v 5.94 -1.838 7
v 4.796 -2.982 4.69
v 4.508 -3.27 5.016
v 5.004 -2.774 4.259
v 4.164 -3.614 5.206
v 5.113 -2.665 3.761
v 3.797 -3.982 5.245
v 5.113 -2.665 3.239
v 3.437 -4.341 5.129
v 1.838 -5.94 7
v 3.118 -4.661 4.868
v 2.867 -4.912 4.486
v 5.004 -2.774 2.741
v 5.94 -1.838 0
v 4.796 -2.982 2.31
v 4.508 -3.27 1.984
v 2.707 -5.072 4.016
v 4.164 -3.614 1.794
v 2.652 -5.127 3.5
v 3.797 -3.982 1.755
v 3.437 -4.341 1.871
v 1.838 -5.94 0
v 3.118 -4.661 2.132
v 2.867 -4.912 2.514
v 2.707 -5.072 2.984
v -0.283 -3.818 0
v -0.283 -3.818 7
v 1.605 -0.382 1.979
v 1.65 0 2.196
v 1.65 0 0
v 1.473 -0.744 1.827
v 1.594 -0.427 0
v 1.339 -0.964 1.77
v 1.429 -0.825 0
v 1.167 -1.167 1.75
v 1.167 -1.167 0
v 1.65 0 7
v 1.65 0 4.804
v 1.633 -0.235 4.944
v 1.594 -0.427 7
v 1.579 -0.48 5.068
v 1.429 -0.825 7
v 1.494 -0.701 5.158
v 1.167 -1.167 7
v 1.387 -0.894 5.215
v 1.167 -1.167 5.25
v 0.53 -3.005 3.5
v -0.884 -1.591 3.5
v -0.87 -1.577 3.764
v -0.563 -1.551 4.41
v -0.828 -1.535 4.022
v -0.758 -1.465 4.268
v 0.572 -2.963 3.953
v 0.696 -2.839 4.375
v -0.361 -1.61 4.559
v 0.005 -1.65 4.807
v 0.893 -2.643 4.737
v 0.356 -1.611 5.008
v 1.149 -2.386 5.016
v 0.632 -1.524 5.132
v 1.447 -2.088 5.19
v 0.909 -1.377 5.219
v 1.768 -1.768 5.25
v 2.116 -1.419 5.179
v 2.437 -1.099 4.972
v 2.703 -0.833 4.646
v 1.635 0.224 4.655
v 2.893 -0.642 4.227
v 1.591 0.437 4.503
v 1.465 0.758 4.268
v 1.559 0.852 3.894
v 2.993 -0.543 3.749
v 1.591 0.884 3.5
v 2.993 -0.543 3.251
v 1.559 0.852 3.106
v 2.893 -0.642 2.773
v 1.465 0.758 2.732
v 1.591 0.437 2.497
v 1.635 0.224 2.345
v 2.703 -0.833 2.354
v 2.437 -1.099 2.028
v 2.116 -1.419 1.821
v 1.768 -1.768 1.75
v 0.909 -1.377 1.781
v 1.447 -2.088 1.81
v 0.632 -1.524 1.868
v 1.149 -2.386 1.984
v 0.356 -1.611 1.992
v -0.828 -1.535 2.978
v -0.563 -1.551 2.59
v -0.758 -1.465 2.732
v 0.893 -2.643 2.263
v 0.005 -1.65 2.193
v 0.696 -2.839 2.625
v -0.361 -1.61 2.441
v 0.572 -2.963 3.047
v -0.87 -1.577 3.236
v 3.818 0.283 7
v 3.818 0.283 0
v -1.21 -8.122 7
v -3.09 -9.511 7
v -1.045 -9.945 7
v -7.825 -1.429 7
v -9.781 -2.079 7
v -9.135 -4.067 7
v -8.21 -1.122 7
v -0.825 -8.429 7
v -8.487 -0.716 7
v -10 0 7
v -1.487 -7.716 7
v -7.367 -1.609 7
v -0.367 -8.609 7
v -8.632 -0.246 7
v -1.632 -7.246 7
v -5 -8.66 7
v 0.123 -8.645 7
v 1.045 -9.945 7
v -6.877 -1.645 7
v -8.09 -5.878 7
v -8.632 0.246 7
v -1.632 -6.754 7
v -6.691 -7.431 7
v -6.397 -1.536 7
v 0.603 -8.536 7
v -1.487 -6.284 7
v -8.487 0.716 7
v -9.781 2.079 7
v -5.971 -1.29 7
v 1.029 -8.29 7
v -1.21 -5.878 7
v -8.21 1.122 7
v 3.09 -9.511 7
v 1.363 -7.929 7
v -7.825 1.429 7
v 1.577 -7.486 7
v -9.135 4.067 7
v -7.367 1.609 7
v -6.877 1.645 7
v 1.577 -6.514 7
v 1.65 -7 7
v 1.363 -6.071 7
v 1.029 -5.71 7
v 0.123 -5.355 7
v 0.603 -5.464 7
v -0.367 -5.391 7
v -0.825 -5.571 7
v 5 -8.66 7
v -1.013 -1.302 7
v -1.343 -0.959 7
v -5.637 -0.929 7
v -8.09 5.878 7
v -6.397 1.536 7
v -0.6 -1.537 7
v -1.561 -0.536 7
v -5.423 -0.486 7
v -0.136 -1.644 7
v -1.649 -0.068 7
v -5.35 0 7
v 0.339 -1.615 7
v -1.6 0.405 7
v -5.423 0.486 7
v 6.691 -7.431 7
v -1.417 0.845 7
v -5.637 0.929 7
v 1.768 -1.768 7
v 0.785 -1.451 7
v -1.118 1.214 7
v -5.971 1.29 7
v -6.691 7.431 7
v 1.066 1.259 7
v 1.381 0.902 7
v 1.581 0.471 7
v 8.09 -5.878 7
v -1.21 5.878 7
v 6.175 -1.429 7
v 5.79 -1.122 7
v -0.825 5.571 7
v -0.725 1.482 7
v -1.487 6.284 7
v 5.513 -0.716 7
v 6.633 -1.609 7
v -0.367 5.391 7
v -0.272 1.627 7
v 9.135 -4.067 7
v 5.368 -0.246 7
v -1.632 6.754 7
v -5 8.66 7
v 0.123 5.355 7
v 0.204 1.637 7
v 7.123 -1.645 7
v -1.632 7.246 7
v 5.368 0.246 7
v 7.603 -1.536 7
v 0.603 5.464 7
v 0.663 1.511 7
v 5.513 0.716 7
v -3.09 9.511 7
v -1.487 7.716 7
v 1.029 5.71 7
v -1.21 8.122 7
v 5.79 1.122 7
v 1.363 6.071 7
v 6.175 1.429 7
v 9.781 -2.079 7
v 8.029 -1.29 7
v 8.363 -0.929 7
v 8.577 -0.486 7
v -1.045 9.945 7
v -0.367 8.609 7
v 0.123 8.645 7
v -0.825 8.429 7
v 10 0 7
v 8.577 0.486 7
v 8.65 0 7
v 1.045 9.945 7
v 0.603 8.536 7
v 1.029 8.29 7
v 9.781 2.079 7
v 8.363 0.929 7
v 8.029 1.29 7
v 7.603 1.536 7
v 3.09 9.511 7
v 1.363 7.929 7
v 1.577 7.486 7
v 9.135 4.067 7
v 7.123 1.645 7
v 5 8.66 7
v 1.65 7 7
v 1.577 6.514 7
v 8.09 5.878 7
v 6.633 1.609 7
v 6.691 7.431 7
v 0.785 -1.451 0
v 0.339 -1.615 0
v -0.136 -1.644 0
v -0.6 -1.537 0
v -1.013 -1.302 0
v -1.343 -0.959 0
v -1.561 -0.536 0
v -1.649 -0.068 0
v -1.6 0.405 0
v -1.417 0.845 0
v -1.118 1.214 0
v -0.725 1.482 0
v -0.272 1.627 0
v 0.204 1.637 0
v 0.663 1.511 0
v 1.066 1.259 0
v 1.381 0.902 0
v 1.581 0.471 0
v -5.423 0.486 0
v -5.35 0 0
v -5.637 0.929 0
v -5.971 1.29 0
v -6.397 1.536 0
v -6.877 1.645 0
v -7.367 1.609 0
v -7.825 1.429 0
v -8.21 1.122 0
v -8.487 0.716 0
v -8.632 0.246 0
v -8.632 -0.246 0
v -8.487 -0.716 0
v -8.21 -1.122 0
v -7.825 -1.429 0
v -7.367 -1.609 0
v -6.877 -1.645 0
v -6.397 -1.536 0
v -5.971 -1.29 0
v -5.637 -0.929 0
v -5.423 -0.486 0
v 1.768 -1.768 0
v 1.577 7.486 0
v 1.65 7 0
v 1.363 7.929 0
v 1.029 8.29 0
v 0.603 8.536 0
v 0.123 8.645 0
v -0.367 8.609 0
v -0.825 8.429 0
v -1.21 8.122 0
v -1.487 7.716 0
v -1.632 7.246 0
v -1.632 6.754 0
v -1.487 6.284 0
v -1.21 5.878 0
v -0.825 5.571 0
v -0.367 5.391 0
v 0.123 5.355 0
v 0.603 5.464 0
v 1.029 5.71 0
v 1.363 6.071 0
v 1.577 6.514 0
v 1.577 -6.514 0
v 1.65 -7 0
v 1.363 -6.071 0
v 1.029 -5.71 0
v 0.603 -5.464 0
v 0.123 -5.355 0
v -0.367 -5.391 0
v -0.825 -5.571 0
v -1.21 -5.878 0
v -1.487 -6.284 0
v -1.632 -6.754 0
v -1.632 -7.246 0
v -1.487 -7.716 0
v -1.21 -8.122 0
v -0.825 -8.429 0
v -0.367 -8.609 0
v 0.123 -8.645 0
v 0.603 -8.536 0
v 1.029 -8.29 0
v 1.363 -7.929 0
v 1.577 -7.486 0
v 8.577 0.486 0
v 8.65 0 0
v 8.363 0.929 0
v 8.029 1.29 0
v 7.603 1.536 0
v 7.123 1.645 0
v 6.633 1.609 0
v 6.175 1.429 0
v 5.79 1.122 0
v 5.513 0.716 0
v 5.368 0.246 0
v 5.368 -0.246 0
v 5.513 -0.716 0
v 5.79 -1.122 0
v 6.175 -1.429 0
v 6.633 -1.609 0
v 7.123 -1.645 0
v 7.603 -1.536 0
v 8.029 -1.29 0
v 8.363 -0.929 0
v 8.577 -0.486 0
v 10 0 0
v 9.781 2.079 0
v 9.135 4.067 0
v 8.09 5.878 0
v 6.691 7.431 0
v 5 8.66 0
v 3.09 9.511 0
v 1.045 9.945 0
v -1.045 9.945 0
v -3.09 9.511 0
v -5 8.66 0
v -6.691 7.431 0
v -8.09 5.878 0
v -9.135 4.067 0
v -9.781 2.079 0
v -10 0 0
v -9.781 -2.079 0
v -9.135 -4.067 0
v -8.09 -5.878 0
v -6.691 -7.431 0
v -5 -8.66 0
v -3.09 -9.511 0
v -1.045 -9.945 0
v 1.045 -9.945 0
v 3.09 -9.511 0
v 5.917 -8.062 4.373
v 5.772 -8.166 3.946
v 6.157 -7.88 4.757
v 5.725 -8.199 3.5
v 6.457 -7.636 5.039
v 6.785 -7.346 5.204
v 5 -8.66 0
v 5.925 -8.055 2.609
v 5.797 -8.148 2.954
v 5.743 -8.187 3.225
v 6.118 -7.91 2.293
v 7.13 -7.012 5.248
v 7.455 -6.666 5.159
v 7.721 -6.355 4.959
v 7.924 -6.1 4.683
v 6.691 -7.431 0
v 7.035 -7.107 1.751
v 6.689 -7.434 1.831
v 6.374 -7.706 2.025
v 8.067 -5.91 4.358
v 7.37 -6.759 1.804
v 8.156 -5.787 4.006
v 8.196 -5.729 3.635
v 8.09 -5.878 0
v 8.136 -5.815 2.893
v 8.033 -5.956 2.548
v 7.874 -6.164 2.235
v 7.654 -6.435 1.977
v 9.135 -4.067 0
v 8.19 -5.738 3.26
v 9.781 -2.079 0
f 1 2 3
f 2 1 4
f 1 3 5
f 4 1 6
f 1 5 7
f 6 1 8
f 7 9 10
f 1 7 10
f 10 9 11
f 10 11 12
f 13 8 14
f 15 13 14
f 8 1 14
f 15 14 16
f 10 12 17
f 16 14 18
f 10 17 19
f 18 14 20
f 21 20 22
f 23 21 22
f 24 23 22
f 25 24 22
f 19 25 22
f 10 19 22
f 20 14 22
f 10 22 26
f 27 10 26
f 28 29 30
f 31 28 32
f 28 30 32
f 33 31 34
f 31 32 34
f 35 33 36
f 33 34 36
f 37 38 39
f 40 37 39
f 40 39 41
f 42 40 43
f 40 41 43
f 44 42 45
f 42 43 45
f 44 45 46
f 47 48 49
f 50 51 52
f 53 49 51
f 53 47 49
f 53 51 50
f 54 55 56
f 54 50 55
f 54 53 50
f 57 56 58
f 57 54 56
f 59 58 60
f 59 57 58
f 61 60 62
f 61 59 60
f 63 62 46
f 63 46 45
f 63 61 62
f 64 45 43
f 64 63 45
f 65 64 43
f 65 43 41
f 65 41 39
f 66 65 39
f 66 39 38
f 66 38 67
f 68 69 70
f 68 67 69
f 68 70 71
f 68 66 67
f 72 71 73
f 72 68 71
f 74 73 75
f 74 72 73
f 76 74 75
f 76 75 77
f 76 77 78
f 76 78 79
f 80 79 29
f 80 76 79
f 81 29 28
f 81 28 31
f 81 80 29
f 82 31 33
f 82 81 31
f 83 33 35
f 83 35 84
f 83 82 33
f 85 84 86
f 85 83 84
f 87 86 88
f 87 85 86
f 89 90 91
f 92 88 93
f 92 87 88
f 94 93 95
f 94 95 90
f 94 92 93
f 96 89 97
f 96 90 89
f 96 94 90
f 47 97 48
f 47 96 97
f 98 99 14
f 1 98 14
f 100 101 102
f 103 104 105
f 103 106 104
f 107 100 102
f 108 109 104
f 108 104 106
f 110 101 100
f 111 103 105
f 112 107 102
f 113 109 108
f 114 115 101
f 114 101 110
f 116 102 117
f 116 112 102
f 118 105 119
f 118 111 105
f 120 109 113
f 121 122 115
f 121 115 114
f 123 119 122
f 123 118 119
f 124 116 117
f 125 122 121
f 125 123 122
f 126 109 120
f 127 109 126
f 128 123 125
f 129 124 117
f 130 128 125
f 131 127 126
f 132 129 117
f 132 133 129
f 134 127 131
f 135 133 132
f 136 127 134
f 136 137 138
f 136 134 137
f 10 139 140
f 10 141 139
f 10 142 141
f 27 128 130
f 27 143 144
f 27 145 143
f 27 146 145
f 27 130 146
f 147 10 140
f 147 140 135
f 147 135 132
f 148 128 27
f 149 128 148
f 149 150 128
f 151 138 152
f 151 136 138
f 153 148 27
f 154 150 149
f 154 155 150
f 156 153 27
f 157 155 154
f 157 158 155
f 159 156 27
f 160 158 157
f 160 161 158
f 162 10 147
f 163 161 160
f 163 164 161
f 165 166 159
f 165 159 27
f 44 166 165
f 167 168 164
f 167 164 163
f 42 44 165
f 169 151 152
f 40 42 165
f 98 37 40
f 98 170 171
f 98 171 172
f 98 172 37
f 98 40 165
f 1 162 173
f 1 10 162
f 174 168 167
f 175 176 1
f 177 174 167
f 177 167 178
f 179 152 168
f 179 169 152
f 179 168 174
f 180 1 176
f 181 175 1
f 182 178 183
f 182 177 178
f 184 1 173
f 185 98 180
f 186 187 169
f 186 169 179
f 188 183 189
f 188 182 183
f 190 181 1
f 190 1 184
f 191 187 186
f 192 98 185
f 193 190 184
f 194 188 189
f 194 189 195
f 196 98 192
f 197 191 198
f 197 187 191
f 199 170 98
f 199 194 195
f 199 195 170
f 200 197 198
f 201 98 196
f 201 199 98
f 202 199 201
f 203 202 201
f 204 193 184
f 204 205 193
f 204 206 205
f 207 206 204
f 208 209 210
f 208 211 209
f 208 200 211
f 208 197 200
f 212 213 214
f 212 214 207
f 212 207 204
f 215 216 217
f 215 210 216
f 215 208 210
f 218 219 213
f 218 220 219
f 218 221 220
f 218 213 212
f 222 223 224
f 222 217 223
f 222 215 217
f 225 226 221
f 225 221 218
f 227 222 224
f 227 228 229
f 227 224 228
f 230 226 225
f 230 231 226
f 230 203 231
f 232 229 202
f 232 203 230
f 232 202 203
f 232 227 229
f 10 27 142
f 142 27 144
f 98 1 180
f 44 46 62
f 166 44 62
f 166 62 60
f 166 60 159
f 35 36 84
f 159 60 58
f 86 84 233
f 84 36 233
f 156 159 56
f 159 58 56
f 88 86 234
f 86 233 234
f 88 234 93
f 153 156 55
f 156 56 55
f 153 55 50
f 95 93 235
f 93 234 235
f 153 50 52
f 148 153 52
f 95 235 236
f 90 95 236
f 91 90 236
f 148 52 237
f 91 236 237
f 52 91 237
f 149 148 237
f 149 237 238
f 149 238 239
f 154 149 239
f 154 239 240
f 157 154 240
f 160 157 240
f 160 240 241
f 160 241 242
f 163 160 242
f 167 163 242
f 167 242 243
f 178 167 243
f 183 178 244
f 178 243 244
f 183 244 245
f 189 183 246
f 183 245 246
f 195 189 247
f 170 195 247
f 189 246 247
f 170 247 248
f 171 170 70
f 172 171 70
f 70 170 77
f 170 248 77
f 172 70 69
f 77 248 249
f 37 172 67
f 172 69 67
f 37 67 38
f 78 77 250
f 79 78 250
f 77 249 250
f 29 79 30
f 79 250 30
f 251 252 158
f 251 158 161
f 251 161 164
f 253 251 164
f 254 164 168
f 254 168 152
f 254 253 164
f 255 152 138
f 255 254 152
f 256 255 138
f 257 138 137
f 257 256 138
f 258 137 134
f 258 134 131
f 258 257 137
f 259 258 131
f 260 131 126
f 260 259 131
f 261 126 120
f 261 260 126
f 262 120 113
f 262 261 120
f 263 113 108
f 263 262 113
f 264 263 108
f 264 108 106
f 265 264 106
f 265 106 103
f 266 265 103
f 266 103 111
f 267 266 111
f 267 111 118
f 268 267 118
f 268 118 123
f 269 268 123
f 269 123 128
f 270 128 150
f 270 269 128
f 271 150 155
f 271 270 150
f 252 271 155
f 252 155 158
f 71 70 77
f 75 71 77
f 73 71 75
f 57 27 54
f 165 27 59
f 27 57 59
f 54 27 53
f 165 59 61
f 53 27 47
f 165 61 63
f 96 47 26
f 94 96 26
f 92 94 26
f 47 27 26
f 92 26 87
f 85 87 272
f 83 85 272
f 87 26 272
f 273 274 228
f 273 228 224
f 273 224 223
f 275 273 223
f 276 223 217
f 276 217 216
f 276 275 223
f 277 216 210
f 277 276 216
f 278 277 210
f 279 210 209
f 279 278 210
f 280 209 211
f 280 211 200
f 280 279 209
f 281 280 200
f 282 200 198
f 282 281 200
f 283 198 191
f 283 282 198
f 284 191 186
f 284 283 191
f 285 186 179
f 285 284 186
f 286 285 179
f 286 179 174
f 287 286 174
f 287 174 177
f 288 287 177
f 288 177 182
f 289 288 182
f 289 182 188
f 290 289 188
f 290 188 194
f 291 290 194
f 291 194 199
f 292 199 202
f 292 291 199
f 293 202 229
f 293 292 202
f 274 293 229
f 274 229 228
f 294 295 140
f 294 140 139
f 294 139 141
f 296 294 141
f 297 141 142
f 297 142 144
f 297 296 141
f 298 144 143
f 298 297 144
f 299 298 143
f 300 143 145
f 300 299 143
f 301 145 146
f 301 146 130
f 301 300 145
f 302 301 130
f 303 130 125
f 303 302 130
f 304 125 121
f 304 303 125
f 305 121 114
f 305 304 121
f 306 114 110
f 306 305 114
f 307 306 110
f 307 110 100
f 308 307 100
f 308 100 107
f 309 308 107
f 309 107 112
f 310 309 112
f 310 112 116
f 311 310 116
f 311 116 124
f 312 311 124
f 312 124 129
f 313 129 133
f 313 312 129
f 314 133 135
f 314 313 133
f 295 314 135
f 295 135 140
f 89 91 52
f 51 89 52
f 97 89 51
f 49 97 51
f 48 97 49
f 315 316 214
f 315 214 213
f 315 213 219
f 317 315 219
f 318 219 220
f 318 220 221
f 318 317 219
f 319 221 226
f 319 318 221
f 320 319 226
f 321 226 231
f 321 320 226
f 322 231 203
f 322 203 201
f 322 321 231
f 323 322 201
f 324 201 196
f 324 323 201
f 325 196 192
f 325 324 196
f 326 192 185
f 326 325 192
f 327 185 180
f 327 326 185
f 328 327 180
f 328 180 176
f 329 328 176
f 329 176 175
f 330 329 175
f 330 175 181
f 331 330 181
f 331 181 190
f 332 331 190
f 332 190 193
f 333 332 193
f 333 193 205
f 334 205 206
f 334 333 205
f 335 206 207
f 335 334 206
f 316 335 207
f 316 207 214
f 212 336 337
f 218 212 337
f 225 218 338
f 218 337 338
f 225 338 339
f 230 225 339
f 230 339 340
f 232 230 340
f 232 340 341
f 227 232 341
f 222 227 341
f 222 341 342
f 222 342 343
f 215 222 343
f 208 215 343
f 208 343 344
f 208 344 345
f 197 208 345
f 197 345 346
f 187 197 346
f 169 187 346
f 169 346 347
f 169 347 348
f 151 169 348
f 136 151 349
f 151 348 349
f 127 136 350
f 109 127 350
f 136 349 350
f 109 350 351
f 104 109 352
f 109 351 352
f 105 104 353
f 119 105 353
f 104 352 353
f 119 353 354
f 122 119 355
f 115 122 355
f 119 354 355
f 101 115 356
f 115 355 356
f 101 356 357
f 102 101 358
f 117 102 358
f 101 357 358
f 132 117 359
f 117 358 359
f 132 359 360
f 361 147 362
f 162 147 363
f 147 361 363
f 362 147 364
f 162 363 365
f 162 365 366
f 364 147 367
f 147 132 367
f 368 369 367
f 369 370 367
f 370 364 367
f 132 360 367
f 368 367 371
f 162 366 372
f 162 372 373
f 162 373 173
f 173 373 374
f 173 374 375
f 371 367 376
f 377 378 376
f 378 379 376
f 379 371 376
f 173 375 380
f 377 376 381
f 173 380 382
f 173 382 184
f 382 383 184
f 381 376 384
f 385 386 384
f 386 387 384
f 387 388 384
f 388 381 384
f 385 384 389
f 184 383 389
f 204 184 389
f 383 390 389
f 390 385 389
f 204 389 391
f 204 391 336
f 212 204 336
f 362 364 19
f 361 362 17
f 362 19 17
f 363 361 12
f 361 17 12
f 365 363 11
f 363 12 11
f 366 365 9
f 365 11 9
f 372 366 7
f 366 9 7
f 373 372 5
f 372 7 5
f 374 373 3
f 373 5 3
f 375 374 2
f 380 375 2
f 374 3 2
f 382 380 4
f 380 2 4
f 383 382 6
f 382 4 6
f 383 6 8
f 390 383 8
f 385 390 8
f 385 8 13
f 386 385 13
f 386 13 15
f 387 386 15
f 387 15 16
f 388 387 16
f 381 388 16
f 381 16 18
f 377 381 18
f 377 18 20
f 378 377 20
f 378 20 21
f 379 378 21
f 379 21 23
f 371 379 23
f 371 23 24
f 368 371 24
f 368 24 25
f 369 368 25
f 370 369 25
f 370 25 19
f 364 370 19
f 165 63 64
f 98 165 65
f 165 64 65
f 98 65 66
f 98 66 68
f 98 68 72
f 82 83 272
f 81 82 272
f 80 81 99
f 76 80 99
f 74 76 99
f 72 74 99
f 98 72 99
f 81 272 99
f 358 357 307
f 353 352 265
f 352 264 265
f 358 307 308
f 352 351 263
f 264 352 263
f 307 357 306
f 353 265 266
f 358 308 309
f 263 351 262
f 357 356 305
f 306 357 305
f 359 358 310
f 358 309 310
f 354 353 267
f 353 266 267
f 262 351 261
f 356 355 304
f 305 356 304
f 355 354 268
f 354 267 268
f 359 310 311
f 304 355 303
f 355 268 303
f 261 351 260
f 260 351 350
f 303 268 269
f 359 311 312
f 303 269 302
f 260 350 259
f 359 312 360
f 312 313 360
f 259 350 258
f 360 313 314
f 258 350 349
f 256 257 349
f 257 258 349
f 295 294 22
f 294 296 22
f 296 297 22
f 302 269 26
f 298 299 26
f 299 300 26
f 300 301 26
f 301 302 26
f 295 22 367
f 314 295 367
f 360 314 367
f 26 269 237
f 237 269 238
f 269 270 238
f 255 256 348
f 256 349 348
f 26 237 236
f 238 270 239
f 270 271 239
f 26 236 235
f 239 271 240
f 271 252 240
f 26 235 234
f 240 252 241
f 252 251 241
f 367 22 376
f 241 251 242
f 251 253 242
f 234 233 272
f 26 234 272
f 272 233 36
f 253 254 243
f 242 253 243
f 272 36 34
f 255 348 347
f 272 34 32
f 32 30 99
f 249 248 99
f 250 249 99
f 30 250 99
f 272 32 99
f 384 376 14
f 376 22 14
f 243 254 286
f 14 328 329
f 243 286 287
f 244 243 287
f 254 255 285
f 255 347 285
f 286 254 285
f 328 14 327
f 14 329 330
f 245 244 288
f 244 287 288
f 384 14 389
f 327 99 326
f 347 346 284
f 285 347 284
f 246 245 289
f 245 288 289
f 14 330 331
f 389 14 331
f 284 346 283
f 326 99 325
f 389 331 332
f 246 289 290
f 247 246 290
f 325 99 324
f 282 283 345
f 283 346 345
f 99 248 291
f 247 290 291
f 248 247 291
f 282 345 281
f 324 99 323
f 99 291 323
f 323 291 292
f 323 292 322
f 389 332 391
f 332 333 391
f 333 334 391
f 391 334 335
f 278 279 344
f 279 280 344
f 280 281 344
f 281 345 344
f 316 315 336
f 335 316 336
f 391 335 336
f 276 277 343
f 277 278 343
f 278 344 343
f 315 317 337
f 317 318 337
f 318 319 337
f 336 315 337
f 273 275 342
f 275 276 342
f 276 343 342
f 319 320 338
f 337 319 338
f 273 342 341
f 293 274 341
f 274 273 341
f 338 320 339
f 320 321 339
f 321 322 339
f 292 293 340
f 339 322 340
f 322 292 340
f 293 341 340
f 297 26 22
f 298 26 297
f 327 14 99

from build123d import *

# Parameters (mm, degrees)
F0_R          = 10
F0_R_2        = 1.65
F1_DEPTH      = 7
F2_R          = 1.75
F3_DEPTH      = 25
F3_DEPTH_BACK = 5


with BuildPart() as f1:
    # F0 (on Top) → F1 (new body)
    with BuildSketch(Plane.XY):
        Circle(F0_R)
        with Locations((0, -7)):
            Circle(F0_R_2, mode=Mode.SUBTRACT)
        Polygon((-0.2828427125, -3.8183766184), (1.767766953, -1.767766953), (3.8183766184, 0.2828427125), (5.939696962, -1.8384776311), (1.8384776311, -5.939696962), align=None, mode=Mode.SUBTRACT)
        with Locations((-7, 0)):
            Circle(F0_R_2, mode=Mode.SUBTRACT)
        with BuildLine():
            ThreePointArc((1.166726189, -1.166726189), (-1.5244012286, 0.6314276634), (1.65, 0))
            ThreePointArc((1.65, 0), (1.5244012286, -0.6314276634), (1.166726189, -1.166726189))
        make_face(mode=Mode.SUBTRACT)
        with Locations((7, 0)):
            Circle(F0_R_2, mode=Mode.SUBTRACT)
        with Locations((0, 7)):
            Circle(F0_R_2, mode=Mode.SUBTRACT)
    extrude(amount=F1_DEPTH)

    # F2 (on face) → F3 (cut, two sides)
    with BuildSketch(Plane(origin=(3.8890872965, -3.8890872965, 0), x_dir=(-0.7071067812, -0.7071067812, 0), z_dir=(-0.7071067812, 0.7071067812, 0))) as f3_sk:
        with Locations((0, 3.5)):
            Circle(F2_R)
    extrude(amount=-F3_DEPTH, mode=Mode.SUBTRACT)
    extrude(f3_sk.sketch, amount=F3_DEPTH_BACK, mode=Mode.SUBTRACT)


solid = f1.part
